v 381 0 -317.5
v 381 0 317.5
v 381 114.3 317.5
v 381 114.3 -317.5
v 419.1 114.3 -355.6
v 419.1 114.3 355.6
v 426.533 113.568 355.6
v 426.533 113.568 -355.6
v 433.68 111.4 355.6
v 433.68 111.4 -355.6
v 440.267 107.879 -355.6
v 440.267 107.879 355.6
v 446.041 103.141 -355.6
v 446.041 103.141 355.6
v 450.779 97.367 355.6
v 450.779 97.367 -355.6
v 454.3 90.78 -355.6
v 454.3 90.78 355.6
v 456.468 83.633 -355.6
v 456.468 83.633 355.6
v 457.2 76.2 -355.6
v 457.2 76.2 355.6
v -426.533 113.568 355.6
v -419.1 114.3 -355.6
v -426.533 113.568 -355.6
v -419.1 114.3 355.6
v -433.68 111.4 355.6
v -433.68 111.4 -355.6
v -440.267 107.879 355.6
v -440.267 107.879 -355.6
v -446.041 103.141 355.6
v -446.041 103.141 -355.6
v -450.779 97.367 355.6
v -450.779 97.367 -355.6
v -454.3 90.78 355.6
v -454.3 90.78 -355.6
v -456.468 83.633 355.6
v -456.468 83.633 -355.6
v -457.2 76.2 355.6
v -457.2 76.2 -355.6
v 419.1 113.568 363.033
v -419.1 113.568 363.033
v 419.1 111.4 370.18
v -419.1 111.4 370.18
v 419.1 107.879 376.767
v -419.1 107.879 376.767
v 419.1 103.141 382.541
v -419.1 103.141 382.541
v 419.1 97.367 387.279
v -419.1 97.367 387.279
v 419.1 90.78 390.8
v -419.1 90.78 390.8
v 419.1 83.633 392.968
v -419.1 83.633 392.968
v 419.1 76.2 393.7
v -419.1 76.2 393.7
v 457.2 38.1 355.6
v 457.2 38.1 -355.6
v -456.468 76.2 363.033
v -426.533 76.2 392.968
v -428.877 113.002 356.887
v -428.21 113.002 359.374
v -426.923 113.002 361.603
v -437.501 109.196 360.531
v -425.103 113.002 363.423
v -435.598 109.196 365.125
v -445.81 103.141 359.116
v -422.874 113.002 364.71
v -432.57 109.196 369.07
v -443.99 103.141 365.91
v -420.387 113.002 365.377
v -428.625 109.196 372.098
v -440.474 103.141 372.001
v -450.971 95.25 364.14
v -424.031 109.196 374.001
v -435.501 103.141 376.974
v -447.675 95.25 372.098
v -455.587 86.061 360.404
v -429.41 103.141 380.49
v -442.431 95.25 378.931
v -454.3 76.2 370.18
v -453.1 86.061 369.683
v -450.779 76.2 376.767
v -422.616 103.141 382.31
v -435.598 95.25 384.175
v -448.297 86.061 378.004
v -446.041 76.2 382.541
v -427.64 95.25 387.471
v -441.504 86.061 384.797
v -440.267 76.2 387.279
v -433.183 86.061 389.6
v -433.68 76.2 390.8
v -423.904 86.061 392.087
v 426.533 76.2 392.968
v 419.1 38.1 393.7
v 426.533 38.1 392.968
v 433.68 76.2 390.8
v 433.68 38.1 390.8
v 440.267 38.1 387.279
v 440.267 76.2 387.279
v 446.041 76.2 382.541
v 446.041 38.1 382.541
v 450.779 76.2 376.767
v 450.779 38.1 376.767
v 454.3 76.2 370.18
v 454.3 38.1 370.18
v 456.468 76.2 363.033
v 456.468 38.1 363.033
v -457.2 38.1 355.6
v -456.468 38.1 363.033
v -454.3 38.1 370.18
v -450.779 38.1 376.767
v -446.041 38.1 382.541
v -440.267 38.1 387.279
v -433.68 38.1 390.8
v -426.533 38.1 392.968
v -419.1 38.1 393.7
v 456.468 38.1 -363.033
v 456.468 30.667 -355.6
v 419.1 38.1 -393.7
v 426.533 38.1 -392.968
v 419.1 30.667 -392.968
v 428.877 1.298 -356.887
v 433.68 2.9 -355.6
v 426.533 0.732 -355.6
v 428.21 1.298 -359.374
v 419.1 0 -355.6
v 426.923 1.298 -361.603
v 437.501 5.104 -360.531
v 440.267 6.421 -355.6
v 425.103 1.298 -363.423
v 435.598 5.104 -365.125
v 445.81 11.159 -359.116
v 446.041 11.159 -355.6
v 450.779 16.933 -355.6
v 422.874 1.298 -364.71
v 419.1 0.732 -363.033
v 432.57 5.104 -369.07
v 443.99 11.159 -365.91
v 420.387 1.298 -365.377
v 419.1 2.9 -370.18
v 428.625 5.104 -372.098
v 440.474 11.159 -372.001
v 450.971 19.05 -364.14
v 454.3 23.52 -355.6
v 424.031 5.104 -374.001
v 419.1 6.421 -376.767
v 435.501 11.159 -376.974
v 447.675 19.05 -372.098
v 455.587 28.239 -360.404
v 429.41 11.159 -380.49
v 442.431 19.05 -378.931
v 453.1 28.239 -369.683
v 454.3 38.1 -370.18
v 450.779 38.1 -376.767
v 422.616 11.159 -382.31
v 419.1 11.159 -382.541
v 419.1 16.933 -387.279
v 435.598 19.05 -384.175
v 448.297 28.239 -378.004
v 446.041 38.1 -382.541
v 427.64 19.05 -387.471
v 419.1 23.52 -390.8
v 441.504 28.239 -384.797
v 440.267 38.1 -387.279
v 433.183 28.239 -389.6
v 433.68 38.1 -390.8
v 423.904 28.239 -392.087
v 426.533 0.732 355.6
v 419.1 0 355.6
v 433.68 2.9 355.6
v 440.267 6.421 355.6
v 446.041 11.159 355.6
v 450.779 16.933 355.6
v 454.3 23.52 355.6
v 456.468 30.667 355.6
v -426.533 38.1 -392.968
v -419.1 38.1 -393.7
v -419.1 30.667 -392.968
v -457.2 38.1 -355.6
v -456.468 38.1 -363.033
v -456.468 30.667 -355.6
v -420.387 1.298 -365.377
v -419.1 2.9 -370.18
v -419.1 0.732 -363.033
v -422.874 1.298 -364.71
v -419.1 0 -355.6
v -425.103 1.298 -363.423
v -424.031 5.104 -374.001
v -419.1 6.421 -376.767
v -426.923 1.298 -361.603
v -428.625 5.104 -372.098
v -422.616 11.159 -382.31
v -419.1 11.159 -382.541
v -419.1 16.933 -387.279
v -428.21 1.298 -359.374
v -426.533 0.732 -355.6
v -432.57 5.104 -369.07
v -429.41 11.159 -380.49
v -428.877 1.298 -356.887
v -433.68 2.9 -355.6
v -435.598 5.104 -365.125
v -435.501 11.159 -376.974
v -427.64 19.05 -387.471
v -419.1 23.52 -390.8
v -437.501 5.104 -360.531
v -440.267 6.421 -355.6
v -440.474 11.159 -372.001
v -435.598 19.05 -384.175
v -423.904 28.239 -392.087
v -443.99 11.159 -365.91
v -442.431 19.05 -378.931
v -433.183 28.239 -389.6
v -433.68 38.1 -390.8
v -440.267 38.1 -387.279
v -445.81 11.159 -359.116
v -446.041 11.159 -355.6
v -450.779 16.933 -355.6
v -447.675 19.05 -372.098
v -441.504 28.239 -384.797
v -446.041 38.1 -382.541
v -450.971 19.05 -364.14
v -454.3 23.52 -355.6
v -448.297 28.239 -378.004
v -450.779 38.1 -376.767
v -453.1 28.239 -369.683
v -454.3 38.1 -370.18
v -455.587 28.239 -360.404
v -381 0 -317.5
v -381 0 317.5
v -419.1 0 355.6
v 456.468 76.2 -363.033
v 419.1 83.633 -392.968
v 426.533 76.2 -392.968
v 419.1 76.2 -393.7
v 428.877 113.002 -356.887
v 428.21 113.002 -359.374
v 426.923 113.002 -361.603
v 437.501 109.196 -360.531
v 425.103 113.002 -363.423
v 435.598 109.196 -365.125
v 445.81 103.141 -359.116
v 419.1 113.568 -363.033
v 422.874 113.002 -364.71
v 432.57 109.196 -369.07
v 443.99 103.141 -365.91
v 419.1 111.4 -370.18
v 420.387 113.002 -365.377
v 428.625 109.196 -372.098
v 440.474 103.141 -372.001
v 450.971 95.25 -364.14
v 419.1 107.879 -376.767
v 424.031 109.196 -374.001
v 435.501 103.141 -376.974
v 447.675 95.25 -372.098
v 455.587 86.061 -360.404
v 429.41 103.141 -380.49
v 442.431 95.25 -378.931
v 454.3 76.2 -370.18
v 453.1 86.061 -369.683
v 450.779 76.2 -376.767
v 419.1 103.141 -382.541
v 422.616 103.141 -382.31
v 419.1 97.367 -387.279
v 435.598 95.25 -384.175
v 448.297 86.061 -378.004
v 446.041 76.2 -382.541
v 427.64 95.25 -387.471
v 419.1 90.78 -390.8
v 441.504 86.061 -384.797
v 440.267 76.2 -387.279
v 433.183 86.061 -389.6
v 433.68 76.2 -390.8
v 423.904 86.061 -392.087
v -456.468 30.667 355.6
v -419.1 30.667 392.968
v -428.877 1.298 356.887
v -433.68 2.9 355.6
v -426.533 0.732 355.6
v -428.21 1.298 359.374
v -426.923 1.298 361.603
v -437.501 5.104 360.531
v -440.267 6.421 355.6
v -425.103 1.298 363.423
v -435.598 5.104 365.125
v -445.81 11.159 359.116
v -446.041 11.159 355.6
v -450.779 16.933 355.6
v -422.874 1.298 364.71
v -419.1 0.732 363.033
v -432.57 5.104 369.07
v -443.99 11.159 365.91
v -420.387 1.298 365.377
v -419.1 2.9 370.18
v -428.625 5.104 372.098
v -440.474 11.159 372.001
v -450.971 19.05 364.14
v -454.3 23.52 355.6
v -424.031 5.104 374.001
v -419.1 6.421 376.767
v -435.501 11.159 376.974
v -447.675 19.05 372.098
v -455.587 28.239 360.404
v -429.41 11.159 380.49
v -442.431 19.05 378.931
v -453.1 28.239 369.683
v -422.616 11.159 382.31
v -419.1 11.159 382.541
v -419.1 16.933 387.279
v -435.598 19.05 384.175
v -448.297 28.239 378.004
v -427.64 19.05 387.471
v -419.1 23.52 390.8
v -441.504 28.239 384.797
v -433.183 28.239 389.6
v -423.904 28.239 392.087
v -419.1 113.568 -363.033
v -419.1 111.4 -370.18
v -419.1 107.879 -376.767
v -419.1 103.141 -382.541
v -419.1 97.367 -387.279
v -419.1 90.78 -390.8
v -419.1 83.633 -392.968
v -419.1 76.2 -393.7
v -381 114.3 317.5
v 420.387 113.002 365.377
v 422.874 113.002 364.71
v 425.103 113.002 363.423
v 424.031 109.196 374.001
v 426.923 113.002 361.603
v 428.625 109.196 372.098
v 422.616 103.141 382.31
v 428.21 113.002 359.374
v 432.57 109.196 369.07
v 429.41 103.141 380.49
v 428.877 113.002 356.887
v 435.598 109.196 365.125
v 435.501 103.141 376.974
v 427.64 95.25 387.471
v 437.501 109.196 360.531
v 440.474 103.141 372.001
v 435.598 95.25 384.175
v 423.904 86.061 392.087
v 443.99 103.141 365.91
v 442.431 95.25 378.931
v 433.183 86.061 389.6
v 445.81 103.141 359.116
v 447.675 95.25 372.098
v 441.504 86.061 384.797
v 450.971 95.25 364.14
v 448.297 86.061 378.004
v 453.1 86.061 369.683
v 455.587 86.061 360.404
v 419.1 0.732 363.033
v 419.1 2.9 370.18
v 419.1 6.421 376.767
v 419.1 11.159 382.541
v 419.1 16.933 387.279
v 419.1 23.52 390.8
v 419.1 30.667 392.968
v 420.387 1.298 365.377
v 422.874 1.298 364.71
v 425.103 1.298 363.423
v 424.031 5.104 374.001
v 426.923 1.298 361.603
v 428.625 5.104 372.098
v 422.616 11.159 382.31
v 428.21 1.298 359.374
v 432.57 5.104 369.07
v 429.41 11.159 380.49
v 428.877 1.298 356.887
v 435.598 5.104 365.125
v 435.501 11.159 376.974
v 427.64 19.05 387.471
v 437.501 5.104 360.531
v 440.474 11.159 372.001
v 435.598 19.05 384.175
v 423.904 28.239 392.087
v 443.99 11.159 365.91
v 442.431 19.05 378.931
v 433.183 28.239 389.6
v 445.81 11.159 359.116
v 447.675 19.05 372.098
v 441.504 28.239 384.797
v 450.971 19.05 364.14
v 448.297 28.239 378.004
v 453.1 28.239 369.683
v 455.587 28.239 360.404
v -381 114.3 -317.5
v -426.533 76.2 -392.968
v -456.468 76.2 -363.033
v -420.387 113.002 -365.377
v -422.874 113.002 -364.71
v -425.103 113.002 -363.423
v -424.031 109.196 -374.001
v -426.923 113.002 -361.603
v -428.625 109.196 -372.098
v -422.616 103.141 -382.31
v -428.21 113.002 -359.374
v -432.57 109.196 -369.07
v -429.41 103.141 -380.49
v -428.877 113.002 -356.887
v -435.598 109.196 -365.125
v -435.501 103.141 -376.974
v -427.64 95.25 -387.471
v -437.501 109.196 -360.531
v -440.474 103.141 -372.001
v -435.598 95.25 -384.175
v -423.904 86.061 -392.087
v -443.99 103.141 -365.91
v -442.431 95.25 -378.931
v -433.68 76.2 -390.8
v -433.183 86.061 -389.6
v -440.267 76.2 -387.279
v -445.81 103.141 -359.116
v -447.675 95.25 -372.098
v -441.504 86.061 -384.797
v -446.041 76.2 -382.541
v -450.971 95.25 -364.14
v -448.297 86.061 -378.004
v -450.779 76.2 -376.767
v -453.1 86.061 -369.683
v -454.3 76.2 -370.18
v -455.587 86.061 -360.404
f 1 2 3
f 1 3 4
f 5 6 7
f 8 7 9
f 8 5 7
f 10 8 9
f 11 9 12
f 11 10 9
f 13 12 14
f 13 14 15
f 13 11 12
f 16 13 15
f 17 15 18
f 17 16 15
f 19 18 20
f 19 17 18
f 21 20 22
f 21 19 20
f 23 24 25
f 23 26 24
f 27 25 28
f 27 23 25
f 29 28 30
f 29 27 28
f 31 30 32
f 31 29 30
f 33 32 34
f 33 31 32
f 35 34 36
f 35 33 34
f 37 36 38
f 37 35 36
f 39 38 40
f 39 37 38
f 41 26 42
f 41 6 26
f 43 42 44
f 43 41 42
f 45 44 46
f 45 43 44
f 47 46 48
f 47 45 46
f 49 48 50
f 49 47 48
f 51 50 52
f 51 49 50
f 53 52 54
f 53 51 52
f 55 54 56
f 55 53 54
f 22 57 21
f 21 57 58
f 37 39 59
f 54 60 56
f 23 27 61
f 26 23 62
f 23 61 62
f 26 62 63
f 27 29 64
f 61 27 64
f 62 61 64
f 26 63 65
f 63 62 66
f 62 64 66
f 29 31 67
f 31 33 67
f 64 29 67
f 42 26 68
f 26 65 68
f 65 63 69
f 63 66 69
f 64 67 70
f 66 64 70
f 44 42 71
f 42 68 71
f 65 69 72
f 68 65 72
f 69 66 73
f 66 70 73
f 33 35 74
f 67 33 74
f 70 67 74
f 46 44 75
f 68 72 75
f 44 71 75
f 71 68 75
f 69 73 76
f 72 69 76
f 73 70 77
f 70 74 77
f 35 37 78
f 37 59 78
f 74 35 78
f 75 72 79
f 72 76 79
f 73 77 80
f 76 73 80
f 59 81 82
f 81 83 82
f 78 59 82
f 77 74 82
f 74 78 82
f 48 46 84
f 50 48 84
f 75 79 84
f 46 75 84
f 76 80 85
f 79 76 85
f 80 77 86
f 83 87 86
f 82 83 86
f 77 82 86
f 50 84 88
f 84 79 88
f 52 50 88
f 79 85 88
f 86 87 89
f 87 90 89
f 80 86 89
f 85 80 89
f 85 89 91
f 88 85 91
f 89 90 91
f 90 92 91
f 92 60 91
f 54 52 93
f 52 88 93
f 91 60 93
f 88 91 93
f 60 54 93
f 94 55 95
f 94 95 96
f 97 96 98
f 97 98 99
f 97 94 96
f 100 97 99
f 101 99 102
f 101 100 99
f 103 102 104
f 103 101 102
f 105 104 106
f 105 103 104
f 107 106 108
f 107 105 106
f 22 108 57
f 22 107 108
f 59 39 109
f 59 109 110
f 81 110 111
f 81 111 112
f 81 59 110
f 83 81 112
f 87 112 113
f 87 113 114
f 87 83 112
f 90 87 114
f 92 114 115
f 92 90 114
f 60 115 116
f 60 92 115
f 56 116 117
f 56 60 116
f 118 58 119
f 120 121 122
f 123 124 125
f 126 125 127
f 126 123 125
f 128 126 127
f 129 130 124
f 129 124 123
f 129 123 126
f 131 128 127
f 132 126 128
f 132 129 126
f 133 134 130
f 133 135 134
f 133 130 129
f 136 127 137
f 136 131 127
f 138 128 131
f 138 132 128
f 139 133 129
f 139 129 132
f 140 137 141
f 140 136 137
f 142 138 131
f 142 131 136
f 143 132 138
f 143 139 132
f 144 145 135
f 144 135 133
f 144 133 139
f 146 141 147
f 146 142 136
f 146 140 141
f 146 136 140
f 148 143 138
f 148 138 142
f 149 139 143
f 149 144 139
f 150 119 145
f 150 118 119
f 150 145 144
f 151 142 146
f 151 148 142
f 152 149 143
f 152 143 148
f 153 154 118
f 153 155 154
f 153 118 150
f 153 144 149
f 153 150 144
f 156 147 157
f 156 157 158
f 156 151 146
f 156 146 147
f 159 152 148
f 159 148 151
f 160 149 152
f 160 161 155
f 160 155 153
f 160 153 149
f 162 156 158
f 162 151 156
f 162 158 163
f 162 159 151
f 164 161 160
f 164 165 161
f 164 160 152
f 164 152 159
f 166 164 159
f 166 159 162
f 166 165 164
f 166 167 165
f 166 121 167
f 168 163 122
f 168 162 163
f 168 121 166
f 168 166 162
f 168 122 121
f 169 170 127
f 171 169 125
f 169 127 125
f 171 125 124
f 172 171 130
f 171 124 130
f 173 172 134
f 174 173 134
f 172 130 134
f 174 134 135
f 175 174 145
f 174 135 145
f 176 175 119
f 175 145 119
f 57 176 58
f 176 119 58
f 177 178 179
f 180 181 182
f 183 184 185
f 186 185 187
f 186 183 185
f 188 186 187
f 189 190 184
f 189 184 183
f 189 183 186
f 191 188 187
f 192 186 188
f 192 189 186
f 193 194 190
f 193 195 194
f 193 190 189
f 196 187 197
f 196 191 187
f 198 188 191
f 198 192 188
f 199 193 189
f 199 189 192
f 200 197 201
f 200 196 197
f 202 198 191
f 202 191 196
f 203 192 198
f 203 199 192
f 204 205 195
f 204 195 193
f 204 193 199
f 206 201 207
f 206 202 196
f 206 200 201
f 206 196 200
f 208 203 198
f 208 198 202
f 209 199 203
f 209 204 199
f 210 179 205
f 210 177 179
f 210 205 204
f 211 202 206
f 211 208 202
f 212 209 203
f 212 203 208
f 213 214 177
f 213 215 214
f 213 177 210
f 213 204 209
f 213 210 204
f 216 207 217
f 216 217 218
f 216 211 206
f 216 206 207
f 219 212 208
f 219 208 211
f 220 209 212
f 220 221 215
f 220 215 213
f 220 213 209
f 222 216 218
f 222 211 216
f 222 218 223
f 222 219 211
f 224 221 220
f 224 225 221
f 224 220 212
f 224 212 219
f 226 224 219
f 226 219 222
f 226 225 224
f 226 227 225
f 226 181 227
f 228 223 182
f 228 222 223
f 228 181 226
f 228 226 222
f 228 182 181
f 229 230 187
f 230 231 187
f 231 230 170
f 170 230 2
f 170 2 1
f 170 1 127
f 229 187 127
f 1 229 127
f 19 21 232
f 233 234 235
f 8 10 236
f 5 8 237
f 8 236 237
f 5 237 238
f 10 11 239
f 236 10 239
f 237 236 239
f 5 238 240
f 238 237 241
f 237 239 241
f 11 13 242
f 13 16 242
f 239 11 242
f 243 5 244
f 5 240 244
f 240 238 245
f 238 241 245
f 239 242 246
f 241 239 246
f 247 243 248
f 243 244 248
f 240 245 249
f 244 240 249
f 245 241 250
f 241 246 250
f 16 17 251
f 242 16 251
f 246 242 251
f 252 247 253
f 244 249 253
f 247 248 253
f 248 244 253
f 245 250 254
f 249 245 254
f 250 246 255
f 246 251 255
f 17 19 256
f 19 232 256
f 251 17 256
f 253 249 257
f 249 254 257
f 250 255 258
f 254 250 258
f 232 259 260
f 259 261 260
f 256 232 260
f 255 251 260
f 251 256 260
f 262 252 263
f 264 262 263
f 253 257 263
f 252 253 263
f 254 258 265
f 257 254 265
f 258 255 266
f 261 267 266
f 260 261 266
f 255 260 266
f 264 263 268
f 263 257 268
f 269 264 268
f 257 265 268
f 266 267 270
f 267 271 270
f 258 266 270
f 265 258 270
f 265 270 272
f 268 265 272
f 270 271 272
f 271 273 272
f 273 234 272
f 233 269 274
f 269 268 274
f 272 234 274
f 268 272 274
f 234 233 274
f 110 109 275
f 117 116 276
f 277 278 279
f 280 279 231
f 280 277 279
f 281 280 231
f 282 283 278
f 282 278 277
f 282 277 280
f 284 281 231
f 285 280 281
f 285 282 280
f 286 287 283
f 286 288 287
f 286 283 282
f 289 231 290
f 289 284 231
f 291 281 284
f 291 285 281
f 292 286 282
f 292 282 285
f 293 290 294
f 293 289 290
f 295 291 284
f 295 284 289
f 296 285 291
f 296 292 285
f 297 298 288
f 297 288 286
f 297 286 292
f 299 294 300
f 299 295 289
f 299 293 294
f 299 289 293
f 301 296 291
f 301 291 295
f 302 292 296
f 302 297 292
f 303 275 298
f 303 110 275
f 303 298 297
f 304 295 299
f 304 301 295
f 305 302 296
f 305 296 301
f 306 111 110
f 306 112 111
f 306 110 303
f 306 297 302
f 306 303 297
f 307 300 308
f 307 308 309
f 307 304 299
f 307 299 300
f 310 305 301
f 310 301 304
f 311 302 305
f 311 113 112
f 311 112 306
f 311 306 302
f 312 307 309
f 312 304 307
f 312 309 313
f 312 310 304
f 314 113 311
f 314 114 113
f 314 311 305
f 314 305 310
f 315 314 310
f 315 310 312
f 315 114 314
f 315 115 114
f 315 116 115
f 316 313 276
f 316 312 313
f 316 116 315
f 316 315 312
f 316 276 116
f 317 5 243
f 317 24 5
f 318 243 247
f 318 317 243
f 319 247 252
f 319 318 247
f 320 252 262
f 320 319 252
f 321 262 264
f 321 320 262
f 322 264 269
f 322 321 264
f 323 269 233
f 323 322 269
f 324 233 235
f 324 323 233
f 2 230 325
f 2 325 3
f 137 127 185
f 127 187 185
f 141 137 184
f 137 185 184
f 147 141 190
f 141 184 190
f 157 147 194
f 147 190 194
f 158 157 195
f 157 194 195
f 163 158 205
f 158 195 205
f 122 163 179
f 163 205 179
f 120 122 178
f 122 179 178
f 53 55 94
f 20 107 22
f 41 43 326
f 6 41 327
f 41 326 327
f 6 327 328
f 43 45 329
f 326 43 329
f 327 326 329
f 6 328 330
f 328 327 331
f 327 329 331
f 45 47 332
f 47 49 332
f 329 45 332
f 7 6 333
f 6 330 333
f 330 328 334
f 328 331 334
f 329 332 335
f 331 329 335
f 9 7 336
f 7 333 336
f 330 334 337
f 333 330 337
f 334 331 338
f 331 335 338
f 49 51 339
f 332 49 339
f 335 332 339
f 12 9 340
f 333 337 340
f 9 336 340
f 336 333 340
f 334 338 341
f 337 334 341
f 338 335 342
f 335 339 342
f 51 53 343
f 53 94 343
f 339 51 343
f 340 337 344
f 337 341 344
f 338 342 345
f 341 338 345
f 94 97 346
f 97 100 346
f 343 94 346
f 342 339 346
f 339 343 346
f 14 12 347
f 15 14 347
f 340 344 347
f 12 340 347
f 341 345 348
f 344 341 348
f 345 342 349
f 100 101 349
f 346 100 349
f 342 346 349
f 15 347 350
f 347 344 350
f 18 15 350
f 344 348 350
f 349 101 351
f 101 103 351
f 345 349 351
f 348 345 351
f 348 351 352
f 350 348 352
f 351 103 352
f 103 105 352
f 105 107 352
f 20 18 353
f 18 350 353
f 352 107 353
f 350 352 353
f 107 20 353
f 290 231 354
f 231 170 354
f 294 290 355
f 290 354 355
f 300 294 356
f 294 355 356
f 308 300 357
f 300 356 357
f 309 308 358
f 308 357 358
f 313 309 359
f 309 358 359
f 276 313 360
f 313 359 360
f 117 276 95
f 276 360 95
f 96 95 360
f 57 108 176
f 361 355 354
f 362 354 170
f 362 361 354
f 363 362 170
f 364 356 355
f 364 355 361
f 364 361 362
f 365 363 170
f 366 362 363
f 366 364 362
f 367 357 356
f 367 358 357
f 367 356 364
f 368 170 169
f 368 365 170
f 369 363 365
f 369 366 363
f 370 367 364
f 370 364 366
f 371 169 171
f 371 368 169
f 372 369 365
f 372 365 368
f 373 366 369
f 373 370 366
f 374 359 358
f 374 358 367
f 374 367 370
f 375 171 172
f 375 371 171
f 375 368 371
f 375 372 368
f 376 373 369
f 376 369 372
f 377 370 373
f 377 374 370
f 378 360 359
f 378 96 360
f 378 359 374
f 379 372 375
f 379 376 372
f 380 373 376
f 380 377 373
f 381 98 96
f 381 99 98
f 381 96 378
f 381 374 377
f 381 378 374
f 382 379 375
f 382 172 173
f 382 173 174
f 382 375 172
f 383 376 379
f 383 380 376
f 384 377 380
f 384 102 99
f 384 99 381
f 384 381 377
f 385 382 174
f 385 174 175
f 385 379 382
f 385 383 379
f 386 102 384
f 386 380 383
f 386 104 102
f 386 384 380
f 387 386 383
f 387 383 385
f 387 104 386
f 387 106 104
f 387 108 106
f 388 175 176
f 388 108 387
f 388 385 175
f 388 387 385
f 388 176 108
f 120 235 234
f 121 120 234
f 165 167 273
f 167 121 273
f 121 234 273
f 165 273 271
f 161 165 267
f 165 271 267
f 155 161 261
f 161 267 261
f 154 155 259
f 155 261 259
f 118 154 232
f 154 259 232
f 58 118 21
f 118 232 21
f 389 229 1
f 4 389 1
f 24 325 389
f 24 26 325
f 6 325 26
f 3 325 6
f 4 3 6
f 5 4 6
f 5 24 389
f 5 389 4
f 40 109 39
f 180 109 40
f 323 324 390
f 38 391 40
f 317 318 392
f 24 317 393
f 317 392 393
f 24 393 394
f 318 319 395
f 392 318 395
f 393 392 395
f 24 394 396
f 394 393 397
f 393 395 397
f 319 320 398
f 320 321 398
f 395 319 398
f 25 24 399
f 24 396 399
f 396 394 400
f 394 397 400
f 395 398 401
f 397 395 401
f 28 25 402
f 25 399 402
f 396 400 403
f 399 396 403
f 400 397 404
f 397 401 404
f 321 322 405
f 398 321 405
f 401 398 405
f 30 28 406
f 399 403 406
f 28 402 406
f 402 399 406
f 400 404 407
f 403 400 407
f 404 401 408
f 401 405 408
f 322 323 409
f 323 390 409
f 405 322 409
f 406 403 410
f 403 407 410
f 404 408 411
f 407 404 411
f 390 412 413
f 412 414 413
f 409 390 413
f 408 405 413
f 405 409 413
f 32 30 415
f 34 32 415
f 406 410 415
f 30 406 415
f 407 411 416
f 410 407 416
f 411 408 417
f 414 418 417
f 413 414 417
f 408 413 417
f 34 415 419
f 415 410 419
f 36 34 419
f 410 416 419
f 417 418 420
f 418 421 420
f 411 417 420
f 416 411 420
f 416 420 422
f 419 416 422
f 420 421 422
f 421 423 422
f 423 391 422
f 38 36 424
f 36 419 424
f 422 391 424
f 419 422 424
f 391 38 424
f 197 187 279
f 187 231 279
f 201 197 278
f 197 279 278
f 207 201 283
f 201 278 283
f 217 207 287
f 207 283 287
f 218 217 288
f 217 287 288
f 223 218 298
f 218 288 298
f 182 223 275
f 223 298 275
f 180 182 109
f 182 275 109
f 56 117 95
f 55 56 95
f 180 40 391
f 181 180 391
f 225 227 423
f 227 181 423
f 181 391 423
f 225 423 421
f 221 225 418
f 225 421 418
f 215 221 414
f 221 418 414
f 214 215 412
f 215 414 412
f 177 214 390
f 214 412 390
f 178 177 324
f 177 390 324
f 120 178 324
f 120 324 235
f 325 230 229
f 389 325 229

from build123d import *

# Parameters (mm, degrees)
SKETCH1_W           = 914.4
SKETCH1_H           = 787.4
SKETCH1_W_2         = 762
SKETCH1_H_2         = 635
BOSS_EXTRUDE1_DEPTH = 114.3
FILLET2_R           = 38.1
FILLET3_R           = 38.1
FILLET4_R           = 38.1


with BuildPart() as part:
    # Sketch1 → Boss-Extrude1 (new body)
    with BuildSketch(Plane(origin=(0, 0, 0), x_dir=(1, 0, 0), z_dir=(0, 1, 0))):
        Rectangle(SKETCH1_W, SKETCH1_H)
        Rectangle(SKETCH1_W_2, SKETCH1_H_2, mode=Mode.SUBTRACT)
    extrude(amount=BOSS_EXTRUDE1_DEPTH)

    # Fillet2
    fillet2_edges = [part.edges().sort_by_distance(p)[0] for p in [
        (457.2, 57.15, 393.7),
        (-457.2, 57.15, 393.7),
        (-457.2, 57.15, -393.7),
        (457.2, 57.15, -393.7),
    ]]
    fillet(fillet2_edges, radius=FILLET2_R)

    # Fillet3
    fillet3_edges = [part.edges().sort_by_distance(p)[0] for p in [
        (457.2, 114.3, 0),
        (0, 114.3, 393.7),
        (0, 114.3, -393.7),
        (-457.2, 114.3, 0),
        (446.040768363, 114.3, -382.540768363),
        (-446.040768363, 114.3, -382.540768363),
        (-446.040768363, 114.3, 382.540768363),
        (446.040768363, 114.3, 382.540768363),
    ]]
    fillet(fillet3_edges, radius=FILLET3_R)

    # Fillet4
    fillet4_edges = [part.edges().sort_by_distance(p)[0] for p in [
        (457.2, 0, 0),
        (0, 0, 393.7),
        (-457.2, 0, 0),
        (0, 0, -393.7),
        (446.040768363, 0, -382.540768363),
        (-446.040768363, 0, -382.540768363),
        (-446.040768363, 0, 382.540768363),
        (446.040768363, 0, 382.540768363),
    ]]
    fillet(fillet4_edges, radius=FILLET4_R)


solid = part.part
